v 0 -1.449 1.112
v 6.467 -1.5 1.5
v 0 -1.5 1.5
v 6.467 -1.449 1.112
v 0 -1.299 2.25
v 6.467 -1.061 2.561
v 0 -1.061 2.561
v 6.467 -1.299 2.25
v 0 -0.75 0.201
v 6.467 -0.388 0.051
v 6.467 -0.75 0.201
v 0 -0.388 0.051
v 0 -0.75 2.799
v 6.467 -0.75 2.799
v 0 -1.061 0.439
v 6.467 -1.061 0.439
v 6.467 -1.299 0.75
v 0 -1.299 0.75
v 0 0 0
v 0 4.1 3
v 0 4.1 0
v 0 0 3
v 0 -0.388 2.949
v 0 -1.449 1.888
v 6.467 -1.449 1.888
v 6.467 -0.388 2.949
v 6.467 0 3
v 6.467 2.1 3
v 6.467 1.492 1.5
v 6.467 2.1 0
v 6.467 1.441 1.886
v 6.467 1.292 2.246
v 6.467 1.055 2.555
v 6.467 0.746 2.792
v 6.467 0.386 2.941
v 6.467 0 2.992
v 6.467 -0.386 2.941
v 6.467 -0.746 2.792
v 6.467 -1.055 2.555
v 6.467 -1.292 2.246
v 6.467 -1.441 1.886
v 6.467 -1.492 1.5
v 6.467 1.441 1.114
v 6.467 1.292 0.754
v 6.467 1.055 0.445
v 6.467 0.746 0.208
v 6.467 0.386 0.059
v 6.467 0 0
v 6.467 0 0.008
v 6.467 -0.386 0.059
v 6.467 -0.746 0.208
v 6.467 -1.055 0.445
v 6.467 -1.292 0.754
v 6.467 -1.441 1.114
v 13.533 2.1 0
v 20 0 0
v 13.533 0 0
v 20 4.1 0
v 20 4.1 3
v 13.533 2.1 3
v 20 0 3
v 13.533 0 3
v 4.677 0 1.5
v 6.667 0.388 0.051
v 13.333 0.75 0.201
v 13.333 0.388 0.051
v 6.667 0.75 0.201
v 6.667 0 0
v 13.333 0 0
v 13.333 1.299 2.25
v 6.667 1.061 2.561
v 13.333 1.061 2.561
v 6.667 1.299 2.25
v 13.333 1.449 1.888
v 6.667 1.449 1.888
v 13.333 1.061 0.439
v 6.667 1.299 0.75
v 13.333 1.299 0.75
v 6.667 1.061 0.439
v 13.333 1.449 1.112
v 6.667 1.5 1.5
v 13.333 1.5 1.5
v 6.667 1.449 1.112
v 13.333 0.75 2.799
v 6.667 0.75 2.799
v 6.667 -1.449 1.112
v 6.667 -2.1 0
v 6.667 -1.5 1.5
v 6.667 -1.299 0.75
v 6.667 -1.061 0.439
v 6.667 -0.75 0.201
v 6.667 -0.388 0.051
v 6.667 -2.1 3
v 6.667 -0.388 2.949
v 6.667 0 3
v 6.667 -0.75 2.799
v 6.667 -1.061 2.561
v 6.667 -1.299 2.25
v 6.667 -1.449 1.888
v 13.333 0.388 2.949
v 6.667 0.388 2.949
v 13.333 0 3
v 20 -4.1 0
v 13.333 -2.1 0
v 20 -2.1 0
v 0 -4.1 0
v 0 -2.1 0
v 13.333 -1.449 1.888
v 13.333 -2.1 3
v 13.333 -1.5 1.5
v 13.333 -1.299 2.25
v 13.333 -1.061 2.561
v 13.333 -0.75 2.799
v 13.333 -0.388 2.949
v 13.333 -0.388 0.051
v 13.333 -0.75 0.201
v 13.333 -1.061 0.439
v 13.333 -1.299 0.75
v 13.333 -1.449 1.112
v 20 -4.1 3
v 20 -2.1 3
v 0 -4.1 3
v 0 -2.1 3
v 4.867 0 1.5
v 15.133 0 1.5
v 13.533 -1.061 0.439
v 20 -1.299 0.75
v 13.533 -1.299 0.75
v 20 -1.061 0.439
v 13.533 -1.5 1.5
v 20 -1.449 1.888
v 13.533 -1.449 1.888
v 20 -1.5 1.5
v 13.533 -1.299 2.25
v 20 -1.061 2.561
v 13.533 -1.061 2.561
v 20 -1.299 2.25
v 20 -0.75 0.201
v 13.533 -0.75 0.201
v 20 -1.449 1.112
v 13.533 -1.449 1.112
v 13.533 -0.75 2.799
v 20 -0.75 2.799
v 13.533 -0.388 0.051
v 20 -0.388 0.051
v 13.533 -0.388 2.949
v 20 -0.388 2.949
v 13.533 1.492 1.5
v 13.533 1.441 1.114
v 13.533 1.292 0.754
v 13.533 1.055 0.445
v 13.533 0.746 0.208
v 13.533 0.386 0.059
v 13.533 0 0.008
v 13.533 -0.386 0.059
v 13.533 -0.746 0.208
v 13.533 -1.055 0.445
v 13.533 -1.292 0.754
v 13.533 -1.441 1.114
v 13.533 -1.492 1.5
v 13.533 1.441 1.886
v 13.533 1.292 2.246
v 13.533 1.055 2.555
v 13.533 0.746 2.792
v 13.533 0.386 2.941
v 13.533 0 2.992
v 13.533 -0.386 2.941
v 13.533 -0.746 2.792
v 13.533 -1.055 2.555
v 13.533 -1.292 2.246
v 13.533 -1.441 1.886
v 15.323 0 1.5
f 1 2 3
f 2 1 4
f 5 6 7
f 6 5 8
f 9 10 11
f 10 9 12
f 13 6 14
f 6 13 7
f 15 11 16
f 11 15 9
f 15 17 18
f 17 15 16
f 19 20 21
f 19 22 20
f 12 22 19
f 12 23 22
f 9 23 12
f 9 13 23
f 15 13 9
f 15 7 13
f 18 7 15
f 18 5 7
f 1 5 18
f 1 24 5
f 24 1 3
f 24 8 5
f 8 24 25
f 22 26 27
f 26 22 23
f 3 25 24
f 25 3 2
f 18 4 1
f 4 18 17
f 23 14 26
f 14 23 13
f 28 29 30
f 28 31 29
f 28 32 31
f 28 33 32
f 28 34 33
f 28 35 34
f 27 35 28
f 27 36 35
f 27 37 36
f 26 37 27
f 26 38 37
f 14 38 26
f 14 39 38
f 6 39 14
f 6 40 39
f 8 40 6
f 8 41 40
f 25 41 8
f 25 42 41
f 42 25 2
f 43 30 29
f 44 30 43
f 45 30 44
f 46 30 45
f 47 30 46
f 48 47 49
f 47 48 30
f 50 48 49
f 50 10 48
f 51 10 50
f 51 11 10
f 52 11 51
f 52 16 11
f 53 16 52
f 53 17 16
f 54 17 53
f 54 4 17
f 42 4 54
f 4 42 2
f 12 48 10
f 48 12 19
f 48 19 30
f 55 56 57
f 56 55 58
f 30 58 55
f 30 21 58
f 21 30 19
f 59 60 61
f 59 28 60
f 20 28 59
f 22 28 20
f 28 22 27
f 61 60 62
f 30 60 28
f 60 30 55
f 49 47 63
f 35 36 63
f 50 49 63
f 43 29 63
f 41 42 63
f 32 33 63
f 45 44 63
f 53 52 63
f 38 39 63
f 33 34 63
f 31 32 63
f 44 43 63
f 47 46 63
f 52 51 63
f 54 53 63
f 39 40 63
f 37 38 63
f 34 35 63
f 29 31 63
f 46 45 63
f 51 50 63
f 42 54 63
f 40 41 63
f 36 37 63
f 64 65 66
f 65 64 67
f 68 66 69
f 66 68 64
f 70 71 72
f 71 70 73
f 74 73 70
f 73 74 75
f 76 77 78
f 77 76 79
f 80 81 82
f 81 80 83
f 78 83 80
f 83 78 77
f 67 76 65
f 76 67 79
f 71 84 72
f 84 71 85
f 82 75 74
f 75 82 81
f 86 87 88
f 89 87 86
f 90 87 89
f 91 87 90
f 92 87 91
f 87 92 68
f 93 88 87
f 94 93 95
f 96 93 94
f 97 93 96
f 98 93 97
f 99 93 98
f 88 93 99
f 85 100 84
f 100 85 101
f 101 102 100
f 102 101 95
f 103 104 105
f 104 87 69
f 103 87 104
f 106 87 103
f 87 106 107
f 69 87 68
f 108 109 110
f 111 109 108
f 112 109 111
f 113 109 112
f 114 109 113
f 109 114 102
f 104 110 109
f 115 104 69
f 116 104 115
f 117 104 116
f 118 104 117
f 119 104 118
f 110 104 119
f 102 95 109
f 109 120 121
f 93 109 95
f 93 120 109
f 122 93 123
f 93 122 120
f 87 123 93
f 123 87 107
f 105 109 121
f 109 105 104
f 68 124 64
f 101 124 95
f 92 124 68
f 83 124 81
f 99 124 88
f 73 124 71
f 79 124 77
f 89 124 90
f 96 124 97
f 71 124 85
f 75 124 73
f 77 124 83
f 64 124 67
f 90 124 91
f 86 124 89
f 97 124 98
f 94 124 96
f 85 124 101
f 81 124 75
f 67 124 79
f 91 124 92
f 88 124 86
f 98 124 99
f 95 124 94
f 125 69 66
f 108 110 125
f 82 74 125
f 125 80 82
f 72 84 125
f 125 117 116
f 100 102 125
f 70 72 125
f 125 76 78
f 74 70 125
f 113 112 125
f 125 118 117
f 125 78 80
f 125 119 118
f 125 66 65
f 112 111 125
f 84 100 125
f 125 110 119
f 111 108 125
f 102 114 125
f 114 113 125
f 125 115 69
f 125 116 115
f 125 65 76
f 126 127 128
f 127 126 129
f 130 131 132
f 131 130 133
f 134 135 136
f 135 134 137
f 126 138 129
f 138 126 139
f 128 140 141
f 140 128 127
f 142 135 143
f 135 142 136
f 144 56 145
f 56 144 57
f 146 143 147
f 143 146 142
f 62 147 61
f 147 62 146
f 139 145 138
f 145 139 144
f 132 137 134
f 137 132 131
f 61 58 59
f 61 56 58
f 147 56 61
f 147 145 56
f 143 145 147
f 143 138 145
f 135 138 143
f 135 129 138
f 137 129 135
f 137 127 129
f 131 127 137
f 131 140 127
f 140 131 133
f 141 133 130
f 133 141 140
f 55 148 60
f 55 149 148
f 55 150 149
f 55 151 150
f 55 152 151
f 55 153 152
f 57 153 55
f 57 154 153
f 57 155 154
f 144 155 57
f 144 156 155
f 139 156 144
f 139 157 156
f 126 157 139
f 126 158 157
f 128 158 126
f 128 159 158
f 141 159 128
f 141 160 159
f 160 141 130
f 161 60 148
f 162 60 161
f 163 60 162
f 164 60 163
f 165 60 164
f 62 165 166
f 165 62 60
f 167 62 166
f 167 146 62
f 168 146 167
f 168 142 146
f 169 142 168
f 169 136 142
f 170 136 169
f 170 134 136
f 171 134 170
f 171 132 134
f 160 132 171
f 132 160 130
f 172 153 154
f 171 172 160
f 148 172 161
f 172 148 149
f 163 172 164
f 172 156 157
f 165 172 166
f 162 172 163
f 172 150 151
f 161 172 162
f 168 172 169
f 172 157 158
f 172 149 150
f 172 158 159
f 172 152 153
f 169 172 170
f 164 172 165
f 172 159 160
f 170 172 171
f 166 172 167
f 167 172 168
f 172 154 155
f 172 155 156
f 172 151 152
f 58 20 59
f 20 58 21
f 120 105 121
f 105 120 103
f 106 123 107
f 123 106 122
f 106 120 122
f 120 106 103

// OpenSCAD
//math_hinge(1,1,1);
module math_hinge(b, l, h){// mathgrrl cone hinge

//////////////////////////////////////////////////////
// parameters

// Length of the complete hinge
length = 20*l;

// Height (diameter) of the hinge
height = 3*h;

// Clearance between cones and holes
clearance = .2;		

// Clearance between hinge and sides
gap = .6; 				

// Parameters that the user does not get to specify
$fn=24*1;
border = 1*b; 
fudge = .01*1;			// to preserve mesh integrity
corner = 0*1;      	// space between hinge and corner
hinge_radius = height/2;
cone_height = 1.2*hinge_radius;  

//////////////////////////////////////////////////////
// renders

rotate(90,[0,1,0]) 
	translate([-hinge_radius,0,0])
		hinge();

translate([0,hinge_radius+gap,0]) bar();
translate([0,-2*border-hinge_radius-gap,0]) bar();

//translate([0,hinge_radius+gap,0]) square();
//translate([0,-length-hinge_radius-gap,0]) square();


//////////////////////////////////////////////////////
// module for hinge

module hinge(){
	rad = hinge_radius;
	clr = clearance;
	len = (length-2*corner)/3; 
	con = cone_height;
	// left outside hinge = (cylinder+box)-cone
	difference(){
		union(){
			translate([0,0,corner]) cylinder(h=len-clr,r=rad);
			translate([-rad,0,corner]) cube([2*rad,rad+gap,len-clr]);
		}
		translate([0,0,corner+len-con-clr+fudge]) cylinder(h=con,r1=0,r2=rad);
	}
	// inside hinge = cylinder+box+cone+cone
	union(){
		translate([0,0,corner+len]) cylinder(h=len,r=rad);
		translate([-rad,-rad-gap,corner+len]) cube([2*rad,rad+gap,len]);
		translate([0,0,corner+len-con]) cylinder(h=con,r1=0,r2=rad);
		translate([0,0,corner+2*len]) cylinder(h=con,r1=rad,r2=0);
	}
	// right outside hinge = (cylinder+box)-cone
	difference(){
		union(){
			translate([0,0,corner+2*len+clr]) cylinder(h=len-clr,r=rad);
			translate([-rad,0,corner+2*len+clr]) cube([2*rad,rad+gap,len-clr]);
		}
		translate([0,0,corner+2*len+clr-fudge]) cylinder(h=con,r1=rad,r2=0);	
	}
}

//////////////////////////////////////////////////////
// module for square shape

module square(){
	difference(){
		cube([length,length,height]);
		translate([border,border,-fudge])
			cube(	[length-2*border,length-2*border,height+2*fudge]);
	}
}

//////////////////////////////////////////////////////
// module for bar shape

module bar(){
	cube([length,2*border,height]);
}
}
math_hinge(1,1,1);
